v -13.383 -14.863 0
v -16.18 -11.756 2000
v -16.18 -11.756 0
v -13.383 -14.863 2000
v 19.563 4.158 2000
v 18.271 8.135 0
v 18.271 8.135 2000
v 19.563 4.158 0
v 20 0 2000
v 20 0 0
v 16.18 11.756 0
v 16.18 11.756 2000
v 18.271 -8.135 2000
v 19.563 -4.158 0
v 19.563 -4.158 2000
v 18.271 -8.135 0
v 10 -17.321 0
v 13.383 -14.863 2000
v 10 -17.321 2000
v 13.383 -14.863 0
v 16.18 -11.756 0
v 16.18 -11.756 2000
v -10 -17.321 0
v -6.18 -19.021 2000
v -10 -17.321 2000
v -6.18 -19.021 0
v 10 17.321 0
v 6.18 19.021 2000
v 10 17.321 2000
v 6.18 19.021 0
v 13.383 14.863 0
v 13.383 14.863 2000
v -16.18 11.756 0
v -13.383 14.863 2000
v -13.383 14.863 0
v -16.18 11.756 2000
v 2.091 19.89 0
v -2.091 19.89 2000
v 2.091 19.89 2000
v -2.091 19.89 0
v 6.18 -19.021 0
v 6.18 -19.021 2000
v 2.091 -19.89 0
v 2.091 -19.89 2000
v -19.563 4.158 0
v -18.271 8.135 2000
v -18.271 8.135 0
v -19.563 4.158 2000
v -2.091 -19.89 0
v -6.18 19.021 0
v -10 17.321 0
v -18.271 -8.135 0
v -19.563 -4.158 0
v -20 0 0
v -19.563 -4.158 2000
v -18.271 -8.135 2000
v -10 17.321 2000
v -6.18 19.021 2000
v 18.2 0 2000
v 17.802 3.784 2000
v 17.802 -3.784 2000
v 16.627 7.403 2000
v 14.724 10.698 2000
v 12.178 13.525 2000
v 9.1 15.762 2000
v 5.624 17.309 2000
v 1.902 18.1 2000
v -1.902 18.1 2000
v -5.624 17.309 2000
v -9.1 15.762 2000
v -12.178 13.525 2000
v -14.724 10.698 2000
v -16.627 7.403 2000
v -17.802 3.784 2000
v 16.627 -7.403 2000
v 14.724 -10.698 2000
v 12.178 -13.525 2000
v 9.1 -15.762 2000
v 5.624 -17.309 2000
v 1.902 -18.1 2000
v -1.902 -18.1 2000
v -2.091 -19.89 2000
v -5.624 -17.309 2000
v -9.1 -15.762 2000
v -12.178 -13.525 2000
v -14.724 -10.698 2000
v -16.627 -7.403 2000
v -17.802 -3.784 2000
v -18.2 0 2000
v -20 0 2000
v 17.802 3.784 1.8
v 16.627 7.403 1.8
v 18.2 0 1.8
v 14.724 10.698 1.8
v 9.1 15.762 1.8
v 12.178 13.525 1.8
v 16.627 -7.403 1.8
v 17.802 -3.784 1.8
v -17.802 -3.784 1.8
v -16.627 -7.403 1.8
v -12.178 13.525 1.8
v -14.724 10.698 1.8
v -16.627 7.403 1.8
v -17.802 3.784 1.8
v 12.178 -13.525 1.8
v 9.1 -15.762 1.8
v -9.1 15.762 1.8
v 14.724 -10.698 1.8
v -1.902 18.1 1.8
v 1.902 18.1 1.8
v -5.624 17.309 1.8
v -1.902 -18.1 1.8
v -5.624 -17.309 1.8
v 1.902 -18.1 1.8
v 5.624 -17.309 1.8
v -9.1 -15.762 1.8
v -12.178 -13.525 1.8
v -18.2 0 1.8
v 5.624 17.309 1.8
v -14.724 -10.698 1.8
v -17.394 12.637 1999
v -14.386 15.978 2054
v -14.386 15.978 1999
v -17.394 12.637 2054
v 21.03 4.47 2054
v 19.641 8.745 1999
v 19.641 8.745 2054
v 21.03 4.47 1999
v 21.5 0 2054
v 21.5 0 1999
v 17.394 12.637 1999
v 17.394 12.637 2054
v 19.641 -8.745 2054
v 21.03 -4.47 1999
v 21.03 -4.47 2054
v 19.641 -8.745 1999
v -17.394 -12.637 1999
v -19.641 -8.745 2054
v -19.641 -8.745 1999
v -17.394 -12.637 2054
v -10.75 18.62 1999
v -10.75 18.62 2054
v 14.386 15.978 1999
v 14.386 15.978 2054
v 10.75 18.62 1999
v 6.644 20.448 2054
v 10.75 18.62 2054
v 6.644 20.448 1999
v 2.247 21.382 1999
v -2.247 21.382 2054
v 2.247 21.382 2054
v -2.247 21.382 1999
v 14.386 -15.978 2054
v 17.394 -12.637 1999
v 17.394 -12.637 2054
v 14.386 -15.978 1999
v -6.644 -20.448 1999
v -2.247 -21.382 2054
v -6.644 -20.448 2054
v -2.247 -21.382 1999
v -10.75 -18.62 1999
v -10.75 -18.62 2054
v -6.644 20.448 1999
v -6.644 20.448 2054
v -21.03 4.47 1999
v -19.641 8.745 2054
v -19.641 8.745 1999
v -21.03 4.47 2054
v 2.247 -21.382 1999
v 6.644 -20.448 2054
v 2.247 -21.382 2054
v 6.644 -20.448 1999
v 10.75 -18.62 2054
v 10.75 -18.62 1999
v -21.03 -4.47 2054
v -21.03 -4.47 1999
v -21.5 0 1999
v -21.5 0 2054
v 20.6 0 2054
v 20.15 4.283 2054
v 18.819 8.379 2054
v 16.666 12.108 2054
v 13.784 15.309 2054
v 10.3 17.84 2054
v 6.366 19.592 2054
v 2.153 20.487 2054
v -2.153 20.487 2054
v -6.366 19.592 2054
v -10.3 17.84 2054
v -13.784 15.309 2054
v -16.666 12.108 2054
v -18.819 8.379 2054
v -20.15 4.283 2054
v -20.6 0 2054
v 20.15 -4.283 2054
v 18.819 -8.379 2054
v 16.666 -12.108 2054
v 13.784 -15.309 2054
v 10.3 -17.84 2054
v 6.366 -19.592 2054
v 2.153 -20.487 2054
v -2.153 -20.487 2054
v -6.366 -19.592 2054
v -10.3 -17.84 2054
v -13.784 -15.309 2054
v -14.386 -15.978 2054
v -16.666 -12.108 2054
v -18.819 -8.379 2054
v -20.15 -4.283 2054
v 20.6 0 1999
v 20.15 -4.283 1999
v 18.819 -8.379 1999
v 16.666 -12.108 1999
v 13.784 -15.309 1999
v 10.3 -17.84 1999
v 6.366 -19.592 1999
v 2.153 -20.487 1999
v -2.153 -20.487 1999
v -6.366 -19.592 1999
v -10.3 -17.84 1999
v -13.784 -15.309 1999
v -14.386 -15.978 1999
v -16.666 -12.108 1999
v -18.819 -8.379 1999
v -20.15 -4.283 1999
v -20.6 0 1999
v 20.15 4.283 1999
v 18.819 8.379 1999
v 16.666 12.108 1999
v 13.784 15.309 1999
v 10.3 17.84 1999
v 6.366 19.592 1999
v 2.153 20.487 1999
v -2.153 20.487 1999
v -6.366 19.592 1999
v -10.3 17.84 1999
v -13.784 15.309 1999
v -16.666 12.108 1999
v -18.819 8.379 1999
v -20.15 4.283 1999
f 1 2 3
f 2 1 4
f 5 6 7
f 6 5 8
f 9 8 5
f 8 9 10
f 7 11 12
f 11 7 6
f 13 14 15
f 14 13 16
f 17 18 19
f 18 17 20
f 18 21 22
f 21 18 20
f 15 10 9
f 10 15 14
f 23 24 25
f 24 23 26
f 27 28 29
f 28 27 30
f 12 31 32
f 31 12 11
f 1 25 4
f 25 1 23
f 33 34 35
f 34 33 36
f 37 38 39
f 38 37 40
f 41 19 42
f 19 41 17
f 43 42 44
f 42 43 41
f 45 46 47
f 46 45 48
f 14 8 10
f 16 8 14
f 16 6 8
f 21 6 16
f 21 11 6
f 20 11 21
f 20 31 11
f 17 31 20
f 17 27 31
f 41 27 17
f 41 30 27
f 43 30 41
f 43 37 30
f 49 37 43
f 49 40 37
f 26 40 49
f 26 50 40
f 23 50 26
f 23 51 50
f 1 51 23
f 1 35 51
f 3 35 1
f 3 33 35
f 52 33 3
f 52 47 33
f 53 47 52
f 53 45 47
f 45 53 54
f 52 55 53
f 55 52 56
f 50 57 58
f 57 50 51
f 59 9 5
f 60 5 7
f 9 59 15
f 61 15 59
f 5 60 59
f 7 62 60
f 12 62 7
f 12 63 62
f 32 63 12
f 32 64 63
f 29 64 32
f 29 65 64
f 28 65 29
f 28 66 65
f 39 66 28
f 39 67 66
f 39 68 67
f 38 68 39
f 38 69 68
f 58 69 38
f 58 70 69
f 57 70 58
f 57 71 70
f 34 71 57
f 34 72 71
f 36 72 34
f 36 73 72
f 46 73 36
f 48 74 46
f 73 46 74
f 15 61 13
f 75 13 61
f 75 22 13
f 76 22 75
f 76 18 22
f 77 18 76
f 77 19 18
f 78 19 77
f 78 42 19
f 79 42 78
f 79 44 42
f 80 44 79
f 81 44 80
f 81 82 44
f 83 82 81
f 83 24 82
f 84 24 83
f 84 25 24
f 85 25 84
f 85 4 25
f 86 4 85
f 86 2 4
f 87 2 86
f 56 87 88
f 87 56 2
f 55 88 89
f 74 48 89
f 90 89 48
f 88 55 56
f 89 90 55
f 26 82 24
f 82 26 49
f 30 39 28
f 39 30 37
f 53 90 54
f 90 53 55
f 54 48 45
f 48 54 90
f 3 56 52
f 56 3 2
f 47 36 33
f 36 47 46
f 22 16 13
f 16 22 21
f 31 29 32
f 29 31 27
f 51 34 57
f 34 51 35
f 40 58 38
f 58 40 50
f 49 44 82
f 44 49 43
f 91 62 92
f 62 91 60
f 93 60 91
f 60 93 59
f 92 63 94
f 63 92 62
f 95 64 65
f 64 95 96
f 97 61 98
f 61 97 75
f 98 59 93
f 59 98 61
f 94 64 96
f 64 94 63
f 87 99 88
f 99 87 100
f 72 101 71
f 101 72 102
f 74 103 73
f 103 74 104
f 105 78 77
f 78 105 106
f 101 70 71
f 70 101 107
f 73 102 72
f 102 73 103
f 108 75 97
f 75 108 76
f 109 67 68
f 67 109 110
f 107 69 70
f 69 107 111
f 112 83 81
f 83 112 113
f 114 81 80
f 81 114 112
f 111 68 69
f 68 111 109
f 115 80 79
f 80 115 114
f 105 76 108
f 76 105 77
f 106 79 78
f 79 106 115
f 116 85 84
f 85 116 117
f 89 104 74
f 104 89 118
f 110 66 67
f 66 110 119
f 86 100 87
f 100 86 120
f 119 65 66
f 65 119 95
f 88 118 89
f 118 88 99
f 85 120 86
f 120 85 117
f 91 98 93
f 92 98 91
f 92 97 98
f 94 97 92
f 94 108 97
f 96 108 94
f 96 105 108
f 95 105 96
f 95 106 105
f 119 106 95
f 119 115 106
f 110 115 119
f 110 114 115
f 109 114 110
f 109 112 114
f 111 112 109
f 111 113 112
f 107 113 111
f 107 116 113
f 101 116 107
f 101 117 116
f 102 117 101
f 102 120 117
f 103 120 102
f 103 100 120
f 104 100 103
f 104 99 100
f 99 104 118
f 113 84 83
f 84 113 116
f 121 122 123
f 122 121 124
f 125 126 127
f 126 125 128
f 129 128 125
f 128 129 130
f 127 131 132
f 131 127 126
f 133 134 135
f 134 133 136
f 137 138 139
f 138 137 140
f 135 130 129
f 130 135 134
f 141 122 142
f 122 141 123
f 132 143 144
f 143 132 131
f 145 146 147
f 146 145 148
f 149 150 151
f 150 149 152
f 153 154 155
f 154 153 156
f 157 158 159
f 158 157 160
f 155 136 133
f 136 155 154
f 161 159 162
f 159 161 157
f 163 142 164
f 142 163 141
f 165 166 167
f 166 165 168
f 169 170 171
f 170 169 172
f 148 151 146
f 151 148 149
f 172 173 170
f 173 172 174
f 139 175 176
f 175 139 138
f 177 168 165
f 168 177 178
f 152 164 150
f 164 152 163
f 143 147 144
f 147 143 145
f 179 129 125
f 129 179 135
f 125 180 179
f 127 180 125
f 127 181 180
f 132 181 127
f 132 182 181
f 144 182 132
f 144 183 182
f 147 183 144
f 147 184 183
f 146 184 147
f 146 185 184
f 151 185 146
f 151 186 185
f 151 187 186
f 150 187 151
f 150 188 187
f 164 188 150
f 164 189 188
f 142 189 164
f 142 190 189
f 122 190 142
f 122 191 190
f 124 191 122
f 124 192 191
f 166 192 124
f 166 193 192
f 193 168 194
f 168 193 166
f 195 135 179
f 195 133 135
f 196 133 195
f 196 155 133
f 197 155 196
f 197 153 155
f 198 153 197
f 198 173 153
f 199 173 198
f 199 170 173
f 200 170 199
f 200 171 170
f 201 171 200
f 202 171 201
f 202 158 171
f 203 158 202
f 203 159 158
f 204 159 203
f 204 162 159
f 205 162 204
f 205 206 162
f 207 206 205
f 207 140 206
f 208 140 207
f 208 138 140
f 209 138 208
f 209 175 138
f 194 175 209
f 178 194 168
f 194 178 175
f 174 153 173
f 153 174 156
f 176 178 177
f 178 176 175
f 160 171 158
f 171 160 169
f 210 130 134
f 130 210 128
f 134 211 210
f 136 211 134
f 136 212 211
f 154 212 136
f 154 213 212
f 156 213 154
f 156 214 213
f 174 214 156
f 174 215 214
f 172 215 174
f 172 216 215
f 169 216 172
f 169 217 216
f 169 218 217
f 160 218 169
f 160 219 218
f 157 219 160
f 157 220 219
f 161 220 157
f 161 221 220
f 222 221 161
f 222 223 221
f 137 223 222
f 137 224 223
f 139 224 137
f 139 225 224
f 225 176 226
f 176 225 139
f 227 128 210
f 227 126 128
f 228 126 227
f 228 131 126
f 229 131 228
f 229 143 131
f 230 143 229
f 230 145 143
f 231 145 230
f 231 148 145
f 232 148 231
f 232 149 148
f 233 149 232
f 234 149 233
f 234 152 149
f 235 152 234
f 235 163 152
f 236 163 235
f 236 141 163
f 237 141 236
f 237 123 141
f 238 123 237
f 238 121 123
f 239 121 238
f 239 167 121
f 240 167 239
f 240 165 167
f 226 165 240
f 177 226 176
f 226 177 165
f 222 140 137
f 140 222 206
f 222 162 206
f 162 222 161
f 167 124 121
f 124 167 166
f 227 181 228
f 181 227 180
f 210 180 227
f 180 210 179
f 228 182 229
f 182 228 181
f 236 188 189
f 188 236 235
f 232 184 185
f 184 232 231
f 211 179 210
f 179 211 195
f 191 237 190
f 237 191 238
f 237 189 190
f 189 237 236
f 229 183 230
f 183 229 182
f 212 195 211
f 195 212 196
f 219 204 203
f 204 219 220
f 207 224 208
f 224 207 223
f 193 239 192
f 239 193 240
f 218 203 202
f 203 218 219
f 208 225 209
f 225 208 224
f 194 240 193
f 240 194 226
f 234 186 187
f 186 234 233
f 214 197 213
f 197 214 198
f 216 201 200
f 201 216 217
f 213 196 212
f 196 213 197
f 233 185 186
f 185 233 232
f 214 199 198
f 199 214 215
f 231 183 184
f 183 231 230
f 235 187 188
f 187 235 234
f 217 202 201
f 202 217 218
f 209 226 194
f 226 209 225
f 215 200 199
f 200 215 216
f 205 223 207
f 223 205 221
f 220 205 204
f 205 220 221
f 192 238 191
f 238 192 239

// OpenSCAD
// Parameters
length_mm = 2000; //[1000:4000:10]
pipe_od_mm = 40; //[32:80:1]
wall_thickness_mm = 1.8; //[1:4:0.1]
fitting_length_mm = 55; //[30:120:1]
fitting_wall_extra_mm = 1.5; //[0.5:4:0.1]
fitting_id_clearance_mm = 0.6; //[0.2:1.5:0.1]
overlap_mm = 1; //[0.5:2:0.1]

// HT Pipe - complete geometry
module ht_pipe() {
  color([0.85, 0.85, 0.8]) {
    // Pipe body
    difference() {
      cylinder(h=length_mm, r=pipe_od_mm/2, center=false);
      translate([0, 0, wall_thickness_mm])
        cylinder(h=length_mm, r=pipe_od_mm/2 - wall_thickness_mm, center=false);
    }
    
    // End fitting
    difference() {
      translate([0, 0, length_mm - overlap_mm])
        cylinder(h=fitting_length_mm, r=pipe_od_mm/2 + fitting_wall_extra_mm, center=false);
      translate([0, 0, length_mm - overlap_mm])
        cylinder(h=fitting_length_mm, r=pipe_od_mm/2 + fitting_id_clearance_mm, center=false);
    }
  }
}

// Assembly
module assembly() {
  ht_pipe();
}

assembly();
